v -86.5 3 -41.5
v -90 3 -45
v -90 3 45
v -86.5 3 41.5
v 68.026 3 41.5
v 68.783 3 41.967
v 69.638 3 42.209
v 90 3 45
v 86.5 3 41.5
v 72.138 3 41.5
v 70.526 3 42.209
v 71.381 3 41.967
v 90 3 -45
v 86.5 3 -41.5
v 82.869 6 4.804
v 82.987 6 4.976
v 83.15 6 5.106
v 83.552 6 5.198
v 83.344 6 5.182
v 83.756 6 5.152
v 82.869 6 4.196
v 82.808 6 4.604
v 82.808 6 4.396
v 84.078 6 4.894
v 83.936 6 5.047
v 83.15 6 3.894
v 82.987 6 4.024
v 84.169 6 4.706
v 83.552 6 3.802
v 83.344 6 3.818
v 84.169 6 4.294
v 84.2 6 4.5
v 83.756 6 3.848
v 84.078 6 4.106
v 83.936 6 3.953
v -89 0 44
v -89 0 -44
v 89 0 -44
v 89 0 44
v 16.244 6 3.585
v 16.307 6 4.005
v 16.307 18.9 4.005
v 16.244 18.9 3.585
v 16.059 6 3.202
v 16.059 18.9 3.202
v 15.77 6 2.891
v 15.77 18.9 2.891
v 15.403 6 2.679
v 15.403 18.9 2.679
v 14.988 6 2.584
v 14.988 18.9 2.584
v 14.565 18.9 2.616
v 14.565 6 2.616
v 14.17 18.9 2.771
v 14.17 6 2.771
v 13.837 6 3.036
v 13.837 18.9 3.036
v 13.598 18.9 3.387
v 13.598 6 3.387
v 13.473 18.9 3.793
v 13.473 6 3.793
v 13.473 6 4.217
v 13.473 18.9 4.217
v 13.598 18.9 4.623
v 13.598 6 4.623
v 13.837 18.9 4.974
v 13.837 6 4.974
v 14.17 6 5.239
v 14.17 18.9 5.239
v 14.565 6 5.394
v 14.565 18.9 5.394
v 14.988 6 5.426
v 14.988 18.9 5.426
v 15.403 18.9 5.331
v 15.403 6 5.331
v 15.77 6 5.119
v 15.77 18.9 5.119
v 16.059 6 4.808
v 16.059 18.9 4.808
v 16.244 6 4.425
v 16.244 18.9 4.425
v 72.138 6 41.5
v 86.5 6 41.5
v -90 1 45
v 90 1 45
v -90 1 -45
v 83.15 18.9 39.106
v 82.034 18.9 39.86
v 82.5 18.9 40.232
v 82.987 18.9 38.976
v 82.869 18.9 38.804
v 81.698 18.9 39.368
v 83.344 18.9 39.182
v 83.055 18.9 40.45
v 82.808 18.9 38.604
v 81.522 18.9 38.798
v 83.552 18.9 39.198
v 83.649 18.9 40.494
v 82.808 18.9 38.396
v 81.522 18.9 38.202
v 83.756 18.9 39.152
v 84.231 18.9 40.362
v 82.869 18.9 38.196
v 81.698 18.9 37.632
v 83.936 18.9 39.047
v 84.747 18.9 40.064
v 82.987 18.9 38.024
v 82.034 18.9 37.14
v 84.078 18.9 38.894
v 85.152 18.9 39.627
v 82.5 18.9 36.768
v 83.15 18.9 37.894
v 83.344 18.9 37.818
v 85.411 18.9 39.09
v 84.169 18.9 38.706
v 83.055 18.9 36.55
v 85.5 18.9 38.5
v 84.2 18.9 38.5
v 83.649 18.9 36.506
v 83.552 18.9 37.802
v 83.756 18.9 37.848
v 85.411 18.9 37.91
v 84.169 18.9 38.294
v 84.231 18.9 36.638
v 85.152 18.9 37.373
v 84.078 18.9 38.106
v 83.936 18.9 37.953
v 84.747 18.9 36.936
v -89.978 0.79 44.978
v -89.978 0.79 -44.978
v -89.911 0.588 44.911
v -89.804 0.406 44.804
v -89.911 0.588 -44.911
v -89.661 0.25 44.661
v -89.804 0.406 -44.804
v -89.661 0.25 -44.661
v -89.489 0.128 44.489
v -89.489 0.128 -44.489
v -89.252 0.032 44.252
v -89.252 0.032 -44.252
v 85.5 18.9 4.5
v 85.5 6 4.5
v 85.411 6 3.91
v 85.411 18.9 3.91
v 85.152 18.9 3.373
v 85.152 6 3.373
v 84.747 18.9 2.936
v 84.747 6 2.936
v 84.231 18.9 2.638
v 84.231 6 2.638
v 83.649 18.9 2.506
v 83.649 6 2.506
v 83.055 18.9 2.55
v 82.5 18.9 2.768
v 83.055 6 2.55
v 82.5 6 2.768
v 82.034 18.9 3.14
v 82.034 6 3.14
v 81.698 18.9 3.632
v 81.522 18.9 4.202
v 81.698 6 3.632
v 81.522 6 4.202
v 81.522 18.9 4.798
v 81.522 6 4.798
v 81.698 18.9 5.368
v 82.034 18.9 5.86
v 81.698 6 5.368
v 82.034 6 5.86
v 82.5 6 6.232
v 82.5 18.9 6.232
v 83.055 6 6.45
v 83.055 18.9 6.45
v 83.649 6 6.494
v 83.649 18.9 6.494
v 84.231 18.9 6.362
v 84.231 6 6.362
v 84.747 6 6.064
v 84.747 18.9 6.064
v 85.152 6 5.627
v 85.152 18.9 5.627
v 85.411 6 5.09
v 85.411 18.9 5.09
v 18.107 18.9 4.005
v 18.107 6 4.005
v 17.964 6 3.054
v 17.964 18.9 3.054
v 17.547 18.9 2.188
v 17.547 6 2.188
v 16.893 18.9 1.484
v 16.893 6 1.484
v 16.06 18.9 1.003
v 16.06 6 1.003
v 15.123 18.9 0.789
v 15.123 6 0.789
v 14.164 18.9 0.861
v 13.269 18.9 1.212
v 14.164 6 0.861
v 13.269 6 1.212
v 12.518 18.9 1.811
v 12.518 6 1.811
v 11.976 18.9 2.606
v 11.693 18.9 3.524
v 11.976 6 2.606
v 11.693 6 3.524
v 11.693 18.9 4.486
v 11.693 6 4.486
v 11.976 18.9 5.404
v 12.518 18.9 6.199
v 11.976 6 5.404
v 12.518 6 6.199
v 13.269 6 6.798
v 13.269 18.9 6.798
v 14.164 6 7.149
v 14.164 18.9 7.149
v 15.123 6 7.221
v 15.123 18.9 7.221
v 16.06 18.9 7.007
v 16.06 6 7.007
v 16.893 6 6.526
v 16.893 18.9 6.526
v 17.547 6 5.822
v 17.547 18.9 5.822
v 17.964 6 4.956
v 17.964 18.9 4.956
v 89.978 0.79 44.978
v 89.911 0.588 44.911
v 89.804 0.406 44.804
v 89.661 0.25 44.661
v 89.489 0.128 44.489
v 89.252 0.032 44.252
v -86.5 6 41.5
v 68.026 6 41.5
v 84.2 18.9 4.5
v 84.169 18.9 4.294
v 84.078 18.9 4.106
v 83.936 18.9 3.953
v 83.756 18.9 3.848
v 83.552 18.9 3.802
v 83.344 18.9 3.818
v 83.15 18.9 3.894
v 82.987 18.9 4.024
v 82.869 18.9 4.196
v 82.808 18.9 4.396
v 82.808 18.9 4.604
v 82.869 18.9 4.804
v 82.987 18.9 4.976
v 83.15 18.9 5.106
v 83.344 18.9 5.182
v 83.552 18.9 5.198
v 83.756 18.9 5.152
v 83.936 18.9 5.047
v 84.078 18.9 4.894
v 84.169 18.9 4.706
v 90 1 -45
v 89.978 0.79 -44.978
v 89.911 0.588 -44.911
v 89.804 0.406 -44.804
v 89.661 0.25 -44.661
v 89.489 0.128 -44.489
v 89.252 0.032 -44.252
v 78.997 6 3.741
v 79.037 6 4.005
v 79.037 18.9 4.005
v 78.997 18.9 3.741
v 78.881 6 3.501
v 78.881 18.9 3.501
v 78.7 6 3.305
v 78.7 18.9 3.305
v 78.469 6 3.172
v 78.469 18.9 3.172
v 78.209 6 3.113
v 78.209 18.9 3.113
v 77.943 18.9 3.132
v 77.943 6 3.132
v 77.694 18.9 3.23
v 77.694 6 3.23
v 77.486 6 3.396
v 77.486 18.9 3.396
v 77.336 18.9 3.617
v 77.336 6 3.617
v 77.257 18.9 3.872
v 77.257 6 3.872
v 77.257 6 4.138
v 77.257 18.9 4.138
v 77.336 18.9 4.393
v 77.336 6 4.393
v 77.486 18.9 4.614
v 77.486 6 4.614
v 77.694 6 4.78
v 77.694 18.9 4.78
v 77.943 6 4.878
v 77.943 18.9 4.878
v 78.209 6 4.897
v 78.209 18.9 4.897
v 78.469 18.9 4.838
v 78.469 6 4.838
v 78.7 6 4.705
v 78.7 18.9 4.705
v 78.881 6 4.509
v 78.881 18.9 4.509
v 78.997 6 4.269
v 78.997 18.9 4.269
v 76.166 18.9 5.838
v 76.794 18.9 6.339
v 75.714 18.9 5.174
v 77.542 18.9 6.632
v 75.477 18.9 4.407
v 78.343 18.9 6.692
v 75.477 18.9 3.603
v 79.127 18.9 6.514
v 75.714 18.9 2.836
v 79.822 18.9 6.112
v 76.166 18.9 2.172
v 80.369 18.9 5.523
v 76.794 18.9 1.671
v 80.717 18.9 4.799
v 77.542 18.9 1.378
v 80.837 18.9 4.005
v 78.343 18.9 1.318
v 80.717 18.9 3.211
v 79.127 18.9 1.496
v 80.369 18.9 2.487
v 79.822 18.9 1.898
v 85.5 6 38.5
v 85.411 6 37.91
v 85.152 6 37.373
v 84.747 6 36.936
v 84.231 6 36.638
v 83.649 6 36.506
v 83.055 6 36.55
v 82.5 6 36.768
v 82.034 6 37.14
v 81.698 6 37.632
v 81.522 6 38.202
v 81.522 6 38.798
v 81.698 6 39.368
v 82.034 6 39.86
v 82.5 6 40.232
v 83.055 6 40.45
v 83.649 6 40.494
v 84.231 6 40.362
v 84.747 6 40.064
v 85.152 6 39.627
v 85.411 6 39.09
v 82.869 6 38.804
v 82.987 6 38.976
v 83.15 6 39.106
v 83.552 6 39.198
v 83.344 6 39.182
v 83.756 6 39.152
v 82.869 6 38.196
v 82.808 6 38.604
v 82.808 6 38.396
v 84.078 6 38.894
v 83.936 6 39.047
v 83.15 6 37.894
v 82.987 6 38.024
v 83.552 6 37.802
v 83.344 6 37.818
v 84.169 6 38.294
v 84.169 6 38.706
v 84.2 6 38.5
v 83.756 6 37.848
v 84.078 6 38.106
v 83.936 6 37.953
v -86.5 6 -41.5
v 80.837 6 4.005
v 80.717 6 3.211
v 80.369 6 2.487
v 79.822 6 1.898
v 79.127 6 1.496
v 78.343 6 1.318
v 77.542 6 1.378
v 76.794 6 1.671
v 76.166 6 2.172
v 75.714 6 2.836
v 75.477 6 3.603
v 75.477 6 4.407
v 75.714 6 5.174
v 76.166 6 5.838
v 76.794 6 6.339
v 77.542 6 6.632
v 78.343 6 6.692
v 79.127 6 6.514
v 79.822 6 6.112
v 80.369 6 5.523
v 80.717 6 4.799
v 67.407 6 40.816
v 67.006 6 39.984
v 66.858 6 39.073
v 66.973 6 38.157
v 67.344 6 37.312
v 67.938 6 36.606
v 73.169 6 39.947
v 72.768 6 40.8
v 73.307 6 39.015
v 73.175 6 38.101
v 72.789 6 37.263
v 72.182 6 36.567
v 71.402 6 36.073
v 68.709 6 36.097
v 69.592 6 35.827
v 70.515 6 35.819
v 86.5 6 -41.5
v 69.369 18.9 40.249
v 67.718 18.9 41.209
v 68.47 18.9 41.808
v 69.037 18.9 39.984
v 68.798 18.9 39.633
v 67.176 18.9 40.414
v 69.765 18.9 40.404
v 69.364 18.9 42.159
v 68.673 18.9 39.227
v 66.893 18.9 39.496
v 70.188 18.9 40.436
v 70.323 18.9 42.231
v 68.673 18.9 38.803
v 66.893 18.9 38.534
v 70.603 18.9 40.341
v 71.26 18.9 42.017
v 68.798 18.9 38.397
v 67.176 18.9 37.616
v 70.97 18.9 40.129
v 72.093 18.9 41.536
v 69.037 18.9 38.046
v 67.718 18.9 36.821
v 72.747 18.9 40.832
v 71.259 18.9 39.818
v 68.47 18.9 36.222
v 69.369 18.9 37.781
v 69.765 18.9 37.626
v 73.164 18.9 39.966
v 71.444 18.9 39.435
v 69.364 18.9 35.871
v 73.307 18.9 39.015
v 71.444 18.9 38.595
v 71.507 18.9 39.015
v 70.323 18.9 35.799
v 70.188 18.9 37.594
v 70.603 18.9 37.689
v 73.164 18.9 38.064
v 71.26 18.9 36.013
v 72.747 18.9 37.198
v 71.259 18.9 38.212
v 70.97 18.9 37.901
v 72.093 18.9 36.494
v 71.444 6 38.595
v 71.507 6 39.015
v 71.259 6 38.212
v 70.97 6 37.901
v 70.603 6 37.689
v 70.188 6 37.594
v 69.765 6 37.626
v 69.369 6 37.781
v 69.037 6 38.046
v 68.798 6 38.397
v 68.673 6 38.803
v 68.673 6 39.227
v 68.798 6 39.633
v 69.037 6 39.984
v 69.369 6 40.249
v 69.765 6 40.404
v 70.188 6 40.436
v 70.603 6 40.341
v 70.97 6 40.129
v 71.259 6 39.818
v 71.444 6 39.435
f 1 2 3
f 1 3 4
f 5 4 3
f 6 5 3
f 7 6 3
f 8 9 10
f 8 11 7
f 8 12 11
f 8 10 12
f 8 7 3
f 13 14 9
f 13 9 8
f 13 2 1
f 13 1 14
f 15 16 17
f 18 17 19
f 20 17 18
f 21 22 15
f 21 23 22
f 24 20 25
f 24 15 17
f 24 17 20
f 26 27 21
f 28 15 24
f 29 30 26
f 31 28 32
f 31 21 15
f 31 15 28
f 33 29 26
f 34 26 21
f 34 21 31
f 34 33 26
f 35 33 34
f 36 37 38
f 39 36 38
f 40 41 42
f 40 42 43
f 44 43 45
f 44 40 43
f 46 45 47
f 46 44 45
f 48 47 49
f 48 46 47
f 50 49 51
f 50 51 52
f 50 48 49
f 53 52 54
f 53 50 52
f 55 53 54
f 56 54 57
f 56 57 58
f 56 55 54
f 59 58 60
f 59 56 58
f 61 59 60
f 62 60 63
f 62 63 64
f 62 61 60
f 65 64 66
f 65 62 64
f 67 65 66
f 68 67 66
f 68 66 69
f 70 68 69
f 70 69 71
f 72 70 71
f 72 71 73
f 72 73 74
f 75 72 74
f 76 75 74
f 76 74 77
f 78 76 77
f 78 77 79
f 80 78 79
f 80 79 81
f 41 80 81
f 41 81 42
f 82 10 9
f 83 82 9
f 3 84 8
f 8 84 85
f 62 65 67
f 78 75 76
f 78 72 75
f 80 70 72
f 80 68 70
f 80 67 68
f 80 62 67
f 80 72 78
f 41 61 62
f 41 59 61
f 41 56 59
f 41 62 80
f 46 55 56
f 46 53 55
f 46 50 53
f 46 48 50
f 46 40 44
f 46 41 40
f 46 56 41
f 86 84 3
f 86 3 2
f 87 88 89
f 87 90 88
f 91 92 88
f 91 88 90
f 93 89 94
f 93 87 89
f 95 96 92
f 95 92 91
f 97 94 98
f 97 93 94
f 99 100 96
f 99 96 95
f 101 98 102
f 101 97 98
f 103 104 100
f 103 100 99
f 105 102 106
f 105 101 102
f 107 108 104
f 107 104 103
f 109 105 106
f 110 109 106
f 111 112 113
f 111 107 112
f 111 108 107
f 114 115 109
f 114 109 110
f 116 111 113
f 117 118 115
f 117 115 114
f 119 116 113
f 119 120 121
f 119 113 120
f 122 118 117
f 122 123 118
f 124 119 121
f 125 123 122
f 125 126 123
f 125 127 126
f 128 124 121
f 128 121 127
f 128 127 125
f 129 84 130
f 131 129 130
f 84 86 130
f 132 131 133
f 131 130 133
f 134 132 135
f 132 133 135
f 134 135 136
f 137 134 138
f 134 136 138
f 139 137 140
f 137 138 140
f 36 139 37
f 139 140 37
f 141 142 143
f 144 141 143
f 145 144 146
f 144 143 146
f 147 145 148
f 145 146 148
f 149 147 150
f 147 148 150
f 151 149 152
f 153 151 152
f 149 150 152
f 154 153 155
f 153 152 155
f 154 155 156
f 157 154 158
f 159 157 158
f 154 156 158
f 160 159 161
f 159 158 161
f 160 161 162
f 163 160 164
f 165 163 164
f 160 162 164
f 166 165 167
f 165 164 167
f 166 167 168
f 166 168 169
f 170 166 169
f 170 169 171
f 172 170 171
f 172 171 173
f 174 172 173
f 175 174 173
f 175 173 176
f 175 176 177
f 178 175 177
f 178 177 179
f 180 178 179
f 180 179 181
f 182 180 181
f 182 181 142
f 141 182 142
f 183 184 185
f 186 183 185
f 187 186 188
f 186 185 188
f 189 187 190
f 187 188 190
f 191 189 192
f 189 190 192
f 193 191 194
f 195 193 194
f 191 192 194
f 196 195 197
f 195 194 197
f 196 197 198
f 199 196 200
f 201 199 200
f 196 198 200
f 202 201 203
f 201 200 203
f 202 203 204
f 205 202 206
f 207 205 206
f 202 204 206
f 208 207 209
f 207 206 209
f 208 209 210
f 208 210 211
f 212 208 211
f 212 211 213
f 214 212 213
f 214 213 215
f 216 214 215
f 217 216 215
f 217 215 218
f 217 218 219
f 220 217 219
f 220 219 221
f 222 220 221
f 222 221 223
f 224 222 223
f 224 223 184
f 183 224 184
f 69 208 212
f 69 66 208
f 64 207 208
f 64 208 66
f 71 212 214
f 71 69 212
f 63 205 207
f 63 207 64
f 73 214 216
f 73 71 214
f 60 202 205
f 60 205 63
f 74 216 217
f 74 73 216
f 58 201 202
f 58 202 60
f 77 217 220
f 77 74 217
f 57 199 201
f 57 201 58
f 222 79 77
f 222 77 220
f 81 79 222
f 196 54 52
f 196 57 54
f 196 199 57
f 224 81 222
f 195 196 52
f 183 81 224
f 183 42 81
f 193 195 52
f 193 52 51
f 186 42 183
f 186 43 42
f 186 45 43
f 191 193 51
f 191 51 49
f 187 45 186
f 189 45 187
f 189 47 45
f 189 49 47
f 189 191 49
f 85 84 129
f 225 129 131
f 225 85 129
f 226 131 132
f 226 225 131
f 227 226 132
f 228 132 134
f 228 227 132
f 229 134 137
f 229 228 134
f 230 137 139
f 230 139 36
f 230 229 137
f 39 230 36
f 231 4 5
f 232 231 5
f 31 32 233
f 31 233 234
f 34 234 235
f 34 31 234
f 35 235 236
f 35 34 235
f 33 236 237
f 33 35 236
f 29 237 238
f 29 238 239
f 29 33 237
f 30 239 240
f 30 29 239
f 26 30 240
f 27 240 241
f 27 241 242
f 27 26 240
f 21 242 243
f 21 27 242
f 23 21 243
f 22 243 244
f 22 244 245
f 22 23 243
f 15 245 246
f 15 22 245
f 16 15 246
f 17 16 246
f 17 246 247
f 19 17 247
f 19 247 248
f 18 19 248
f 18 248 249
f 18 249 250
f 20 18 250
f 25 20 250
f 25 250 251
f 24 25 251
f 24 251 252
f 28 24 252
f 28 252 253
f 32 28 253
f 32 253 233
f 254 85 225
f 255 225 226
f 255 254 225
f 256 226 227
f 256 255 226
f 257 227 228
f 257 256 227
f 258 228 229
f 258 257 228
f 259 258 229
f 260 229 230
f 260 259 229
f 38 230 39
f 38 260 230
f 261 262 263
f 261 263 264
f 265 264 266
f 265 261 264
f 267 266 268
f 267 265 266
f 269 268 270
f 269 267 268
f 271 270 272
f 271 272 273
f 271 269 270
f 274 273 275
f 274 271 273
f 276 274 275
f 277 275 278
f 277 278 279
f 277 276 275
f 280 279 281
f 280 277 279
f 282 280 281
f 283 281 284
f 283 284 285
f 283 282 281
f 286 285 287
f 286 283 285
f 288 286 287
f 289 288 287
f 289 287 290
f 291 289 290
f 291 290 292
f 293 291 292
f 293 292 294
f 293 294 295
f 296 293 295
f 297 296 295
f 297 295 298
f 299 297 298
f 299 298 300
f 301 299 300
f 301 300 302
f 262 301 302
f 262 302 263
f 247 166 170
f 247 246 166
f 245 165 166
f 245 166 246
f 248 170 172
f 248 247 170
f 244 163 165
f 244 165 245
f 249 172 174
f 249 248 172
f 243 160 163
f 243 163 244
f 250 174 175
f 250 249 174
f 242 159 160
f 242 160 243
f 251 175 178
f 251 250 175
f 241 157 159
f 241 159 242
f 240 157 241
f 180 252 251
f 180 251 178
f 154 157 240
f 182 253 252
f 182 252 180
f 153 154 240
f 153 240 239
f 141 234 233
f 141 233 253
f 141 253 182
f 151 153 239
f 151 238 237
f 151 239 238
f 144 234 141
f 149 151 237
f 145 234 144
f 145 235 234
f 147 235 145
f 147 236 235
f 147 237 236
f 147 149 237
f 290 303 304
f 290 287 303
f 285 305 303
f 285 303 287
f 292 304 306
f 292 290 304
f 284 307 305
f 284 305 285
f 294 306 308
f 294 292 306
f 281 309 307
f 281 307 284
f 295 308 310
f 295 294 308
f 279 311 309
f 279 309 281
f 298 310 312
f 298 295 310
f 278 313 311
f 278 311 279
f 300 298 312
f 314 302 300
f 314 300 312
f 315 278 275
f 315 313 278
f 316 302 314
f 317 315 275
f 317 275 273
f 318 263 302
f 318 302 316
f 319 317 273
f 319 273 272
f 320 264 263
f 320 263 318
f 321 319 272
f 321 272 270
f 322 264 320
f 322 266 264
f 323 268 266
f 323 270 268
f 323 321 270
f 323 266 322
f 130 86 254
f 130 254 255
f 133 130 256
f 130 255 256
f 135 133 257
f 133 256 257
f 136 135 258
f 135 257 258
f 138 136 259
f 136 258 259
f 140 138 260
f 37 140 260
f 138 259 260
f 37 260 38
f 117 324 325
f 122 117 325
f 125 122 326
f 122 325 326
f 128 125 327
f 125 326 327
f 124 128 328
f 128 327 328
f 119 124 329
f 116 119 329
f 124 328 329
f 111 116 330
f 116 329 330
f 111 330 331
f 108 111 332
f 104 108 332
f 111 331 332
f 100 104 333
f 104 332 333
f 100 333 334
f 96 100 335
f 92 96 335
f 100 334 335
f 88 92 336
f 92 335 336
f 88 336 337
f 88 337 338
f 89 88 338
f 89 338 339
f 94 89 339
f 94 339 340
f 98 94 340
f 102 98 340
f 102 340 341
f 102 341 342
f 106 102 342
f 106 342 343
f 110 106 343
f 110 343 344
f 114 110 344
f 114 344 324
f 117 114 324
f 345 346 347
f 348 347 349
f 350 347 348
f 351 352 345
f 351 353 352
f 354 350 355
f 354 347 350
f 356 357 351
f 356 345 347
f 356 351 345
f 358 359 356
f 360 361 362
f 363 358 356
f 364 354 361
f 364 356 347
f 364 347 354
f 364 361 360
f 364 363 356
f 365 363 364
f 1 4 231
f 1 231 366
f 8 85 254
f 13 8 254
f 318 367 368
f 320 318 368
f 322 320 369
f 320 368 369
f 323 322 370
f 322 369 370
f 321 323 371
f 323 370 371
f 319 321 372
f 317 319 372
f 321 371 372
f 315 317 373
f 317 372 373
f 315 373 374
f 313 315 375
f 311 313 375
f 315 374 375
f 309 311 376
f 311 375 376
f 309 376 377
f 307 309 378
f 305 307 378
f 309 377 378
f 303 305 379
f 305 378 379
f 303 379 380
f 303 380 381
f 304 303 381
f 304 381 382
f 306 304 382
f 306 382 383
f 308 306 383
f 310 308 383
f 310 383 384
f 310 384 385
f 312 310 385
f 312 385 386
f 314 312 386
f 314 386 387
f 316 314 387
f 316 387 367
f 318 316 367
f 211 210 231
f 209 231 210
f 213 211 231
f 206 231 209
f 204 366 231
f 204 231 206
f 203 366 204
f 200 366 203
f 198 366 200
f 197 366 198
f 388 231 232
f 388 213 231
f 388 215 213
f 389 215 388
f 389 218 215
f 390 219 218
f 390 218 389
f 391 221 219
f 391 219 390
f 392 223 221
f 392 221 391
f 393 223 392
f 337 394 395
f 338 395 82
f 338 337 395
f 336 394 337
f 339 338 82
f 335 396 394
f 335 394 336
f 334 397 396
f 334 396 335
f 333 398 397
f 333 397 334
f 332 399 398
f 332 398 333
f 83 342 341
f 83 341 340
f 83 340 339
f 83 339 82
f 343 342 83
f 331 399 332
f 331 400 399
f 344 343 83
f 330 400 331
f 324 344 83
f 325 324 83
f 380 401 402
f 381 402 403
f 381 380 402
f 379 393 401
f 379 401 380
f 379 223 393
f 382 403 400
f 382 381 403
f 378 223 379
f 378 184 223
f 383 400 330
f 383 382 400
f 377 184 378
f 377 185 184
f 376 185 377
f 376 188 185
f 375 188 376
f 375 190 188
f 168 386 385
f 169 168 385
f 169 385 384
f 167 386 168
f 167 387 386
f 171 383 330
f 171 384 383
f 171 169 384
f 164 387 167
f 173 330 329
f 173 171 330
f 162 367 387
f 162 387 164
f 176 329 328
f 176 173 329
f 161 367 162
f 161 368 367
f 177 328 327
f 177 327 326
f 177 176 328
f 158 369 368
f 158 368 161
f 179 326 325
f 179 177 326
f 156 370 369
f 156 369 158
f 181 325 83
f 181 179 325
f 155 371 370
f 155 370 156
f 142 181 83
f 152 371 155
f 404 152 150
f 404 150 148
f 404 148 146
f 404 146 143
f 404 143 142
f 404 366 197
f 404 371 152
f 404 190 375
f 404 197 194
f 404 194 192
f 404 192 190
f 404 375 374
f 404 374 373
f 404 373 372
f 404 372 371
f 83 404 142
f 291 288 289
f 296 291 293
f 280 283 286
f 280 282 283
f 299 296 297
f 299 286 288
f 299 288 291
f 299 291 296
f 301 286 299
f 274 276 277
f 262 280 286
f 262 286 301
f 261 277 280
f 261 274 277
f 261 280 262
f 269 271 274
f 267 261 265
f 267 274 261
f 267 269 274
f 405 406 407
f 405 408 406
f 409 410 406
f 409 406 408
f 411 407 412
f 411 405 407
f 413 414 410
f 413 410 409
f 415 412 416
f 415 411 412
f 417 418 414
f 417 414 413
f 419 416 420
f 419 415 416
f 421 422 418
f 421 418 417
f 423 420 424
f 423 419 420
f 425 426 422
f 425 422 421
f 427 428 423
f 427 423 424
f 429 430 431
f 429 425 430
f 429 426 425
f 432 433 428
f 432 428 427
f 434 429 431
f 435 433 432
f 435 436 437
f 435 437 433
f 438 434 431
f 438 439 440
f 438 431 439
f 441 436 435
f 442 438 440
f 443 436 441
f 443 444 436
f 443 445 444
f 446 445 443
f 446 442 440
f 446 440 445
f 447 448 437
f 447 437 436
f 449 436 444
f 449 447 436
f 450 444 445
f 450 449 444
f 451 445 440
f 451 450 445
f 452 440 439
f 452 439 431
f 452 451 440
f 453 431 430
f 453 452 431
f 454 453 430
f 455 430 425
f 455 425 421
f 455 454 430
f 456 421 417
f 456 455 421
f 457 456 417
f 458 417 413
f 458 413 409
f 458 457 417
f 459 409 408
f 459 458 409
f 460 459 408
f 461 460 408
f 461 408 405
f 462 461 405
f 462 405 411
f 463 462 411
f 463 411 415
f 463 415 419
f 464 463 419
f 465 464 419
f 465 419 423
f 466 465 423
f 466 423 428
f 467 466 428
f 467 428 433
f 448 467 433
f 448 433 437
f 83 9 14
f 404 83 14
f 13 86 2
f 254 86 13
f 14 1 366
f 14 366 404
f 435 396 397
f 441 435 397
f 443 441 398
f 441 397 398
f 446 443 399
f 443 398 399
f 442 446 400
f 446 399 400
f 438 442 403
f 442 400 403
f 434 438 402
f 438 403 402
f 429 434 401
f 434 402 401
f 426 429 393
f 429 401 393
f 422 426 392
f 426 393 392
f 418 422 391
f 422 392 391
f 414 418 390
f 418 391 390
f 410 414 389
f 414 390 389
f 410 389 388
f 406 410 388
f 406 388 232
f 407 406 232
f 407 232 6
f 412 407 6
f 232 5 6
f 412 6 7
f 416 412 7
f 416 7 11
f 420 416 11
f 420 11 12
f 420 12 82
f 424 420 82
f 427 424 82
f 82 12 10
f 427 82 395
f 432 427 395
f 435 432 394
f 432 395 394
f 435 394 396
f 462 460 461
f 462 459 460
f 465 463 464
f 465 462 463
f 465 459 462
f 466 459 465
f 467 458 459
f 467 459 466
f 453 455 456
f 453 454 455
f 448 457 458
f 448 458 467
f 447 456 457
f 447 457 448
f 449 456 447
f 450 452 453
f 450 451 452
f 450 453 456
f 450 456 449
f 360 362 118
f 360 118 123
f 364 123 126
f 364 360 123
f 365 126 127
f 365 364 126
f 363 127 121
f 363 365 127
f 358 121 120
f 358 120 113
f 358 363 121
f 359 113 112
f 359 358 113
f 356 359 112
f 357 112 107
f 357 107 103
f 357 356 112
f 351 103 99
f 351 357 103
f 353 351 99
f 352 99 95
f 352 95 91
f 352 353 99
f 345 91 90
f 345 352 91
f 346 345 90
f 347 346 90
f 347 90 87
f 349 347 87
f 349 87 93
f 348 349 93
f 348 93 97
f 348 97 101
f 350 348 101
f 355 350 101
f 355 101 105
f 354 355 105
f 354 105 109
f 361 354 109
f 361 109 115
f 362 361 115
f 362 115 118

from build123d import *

# Parameters (mm, degrees)
SKETCH_1_W      = 180
SKETCH_1_H      = 90
EXTRUDE_1_DEPTH = 3
FILLET_1_R      = 1
SKETCH_2_W      = 173
SKETCH_2_H      = 83
EXTRUDE_2_DEPTH = 3
SKETCH_5_R      = 2.695
SKETCH_5_R_2    = 0.895
SKETCH_5_R_3    = 2
SKETCH_5_R_4    = 0.7
SKETCH_5_R_5    = 3.225
SKETCH_5_R_6    = 1.425
EXTRUDE_3_DEPTH = 15.90000066


with BuildPart() as part:
    # 草图1 → 凸台-拉伸1 (new body)
    with BuildSketch(Plane(origin=(0, 0, 0), x_dir=(1, 0, 0), z_dir=(0, 1, 0))):
        Rectangle(SKETCH_1_W, SKETCH_1_H)
    extrude(amount=EXTRUDE_1_DEPTH)

    # 圆角1
    fillet_1_edges = [part.edges().sort_by_distance(p)[0] for p in [
        (0, 0, -45),
        (90, 0, 0),
        (0, 0, 45),
        (-90, 0, 0),
    ]]
    fillet(fillet_1_edges, radius=FILLET_1_R)

    # 草图2 → 凸台-拉伸2 (add)
    with BuildSketch(Plane(origin=(0, 3, 0), x_dir=(1, 0, 0), z_dir=(0, 1, 0))):
        Rectangle(SKETCH_2_W, SKETCH_2_H)
    extrude(amount=EXTRUDE_2_DEPTH)

    # 草图5 → 凸台-拉伸3 (add)
    # profile 1 of 5: a face of its own
    with BuildSketch(Plane(origin=(0, 3, 0), x_dir=(1, 0, 0), z_dir=(0, 1, 0))):
        with Locations((78.142, -4.005)):
            Circle(SKETCH_5_R)
        with Locations((78.142, -4.005)):
            Circle(SKETCH_5_R_2, mode=Mode.SUBTRACT)
    # profile 2 of 5: a face of its own
    with BuildSketch(Plane(origin=(0, 3, 0), x_dir=(1, 0, 0), z_dir=(0, 1, 0))):
        with Locations((83.5, -4.5)):
            Circle(SKETCH_5_R_3)
        with Locations((83.5, -4.5)):
            Circle(SKETCH_5_R_4, mode=Mode.SUBTRACT)
    # profile 3 of 5: a face of its own
    with BuildSketch(Plane(origin=(0, 3, 0), x_dir=(1, 0, 0), z_dir=(0, 1, 0))):
        with Locations((83.5, -38.5)):
            Circle(SKETCH_5_R_3)
        with Locations((83.5, -38.5)):
            Circle(SKETCH_5_R_4, mode=Mode.SUBTRACT)
    # profile 4 of 5: a face of its own
    with BuildSketch(Plane(origin=(0, 3, 0), x_dir=(1, 0, 0), z_dir=(0, 1, 0))):
        with Locations((14.882, -4.005)):
            Circle(SKETCH_5_R_5)
        with Locations((14.882, -4.005)):
            Circle(SKETCH_5_R_6, mode=Mode.SUBTRACT)
    # profile 5 of 5: a face of its own
    with BuildSketch(Plane(origin=(0, 3, 0), x_dir=(1, 0, 0), z_dir=(0, 1, 0))):
        with Locations((70.082, -39.015)):
            Circle(SKETCH_5_R_5)
        with Locations((70.082, -39.015)):
            Circle(SKETCH_5_R_6, mode=Mode.SUBTRACT)
    extrude(amount=EXTRUDE_3_DEPTH)


solid = part.part
